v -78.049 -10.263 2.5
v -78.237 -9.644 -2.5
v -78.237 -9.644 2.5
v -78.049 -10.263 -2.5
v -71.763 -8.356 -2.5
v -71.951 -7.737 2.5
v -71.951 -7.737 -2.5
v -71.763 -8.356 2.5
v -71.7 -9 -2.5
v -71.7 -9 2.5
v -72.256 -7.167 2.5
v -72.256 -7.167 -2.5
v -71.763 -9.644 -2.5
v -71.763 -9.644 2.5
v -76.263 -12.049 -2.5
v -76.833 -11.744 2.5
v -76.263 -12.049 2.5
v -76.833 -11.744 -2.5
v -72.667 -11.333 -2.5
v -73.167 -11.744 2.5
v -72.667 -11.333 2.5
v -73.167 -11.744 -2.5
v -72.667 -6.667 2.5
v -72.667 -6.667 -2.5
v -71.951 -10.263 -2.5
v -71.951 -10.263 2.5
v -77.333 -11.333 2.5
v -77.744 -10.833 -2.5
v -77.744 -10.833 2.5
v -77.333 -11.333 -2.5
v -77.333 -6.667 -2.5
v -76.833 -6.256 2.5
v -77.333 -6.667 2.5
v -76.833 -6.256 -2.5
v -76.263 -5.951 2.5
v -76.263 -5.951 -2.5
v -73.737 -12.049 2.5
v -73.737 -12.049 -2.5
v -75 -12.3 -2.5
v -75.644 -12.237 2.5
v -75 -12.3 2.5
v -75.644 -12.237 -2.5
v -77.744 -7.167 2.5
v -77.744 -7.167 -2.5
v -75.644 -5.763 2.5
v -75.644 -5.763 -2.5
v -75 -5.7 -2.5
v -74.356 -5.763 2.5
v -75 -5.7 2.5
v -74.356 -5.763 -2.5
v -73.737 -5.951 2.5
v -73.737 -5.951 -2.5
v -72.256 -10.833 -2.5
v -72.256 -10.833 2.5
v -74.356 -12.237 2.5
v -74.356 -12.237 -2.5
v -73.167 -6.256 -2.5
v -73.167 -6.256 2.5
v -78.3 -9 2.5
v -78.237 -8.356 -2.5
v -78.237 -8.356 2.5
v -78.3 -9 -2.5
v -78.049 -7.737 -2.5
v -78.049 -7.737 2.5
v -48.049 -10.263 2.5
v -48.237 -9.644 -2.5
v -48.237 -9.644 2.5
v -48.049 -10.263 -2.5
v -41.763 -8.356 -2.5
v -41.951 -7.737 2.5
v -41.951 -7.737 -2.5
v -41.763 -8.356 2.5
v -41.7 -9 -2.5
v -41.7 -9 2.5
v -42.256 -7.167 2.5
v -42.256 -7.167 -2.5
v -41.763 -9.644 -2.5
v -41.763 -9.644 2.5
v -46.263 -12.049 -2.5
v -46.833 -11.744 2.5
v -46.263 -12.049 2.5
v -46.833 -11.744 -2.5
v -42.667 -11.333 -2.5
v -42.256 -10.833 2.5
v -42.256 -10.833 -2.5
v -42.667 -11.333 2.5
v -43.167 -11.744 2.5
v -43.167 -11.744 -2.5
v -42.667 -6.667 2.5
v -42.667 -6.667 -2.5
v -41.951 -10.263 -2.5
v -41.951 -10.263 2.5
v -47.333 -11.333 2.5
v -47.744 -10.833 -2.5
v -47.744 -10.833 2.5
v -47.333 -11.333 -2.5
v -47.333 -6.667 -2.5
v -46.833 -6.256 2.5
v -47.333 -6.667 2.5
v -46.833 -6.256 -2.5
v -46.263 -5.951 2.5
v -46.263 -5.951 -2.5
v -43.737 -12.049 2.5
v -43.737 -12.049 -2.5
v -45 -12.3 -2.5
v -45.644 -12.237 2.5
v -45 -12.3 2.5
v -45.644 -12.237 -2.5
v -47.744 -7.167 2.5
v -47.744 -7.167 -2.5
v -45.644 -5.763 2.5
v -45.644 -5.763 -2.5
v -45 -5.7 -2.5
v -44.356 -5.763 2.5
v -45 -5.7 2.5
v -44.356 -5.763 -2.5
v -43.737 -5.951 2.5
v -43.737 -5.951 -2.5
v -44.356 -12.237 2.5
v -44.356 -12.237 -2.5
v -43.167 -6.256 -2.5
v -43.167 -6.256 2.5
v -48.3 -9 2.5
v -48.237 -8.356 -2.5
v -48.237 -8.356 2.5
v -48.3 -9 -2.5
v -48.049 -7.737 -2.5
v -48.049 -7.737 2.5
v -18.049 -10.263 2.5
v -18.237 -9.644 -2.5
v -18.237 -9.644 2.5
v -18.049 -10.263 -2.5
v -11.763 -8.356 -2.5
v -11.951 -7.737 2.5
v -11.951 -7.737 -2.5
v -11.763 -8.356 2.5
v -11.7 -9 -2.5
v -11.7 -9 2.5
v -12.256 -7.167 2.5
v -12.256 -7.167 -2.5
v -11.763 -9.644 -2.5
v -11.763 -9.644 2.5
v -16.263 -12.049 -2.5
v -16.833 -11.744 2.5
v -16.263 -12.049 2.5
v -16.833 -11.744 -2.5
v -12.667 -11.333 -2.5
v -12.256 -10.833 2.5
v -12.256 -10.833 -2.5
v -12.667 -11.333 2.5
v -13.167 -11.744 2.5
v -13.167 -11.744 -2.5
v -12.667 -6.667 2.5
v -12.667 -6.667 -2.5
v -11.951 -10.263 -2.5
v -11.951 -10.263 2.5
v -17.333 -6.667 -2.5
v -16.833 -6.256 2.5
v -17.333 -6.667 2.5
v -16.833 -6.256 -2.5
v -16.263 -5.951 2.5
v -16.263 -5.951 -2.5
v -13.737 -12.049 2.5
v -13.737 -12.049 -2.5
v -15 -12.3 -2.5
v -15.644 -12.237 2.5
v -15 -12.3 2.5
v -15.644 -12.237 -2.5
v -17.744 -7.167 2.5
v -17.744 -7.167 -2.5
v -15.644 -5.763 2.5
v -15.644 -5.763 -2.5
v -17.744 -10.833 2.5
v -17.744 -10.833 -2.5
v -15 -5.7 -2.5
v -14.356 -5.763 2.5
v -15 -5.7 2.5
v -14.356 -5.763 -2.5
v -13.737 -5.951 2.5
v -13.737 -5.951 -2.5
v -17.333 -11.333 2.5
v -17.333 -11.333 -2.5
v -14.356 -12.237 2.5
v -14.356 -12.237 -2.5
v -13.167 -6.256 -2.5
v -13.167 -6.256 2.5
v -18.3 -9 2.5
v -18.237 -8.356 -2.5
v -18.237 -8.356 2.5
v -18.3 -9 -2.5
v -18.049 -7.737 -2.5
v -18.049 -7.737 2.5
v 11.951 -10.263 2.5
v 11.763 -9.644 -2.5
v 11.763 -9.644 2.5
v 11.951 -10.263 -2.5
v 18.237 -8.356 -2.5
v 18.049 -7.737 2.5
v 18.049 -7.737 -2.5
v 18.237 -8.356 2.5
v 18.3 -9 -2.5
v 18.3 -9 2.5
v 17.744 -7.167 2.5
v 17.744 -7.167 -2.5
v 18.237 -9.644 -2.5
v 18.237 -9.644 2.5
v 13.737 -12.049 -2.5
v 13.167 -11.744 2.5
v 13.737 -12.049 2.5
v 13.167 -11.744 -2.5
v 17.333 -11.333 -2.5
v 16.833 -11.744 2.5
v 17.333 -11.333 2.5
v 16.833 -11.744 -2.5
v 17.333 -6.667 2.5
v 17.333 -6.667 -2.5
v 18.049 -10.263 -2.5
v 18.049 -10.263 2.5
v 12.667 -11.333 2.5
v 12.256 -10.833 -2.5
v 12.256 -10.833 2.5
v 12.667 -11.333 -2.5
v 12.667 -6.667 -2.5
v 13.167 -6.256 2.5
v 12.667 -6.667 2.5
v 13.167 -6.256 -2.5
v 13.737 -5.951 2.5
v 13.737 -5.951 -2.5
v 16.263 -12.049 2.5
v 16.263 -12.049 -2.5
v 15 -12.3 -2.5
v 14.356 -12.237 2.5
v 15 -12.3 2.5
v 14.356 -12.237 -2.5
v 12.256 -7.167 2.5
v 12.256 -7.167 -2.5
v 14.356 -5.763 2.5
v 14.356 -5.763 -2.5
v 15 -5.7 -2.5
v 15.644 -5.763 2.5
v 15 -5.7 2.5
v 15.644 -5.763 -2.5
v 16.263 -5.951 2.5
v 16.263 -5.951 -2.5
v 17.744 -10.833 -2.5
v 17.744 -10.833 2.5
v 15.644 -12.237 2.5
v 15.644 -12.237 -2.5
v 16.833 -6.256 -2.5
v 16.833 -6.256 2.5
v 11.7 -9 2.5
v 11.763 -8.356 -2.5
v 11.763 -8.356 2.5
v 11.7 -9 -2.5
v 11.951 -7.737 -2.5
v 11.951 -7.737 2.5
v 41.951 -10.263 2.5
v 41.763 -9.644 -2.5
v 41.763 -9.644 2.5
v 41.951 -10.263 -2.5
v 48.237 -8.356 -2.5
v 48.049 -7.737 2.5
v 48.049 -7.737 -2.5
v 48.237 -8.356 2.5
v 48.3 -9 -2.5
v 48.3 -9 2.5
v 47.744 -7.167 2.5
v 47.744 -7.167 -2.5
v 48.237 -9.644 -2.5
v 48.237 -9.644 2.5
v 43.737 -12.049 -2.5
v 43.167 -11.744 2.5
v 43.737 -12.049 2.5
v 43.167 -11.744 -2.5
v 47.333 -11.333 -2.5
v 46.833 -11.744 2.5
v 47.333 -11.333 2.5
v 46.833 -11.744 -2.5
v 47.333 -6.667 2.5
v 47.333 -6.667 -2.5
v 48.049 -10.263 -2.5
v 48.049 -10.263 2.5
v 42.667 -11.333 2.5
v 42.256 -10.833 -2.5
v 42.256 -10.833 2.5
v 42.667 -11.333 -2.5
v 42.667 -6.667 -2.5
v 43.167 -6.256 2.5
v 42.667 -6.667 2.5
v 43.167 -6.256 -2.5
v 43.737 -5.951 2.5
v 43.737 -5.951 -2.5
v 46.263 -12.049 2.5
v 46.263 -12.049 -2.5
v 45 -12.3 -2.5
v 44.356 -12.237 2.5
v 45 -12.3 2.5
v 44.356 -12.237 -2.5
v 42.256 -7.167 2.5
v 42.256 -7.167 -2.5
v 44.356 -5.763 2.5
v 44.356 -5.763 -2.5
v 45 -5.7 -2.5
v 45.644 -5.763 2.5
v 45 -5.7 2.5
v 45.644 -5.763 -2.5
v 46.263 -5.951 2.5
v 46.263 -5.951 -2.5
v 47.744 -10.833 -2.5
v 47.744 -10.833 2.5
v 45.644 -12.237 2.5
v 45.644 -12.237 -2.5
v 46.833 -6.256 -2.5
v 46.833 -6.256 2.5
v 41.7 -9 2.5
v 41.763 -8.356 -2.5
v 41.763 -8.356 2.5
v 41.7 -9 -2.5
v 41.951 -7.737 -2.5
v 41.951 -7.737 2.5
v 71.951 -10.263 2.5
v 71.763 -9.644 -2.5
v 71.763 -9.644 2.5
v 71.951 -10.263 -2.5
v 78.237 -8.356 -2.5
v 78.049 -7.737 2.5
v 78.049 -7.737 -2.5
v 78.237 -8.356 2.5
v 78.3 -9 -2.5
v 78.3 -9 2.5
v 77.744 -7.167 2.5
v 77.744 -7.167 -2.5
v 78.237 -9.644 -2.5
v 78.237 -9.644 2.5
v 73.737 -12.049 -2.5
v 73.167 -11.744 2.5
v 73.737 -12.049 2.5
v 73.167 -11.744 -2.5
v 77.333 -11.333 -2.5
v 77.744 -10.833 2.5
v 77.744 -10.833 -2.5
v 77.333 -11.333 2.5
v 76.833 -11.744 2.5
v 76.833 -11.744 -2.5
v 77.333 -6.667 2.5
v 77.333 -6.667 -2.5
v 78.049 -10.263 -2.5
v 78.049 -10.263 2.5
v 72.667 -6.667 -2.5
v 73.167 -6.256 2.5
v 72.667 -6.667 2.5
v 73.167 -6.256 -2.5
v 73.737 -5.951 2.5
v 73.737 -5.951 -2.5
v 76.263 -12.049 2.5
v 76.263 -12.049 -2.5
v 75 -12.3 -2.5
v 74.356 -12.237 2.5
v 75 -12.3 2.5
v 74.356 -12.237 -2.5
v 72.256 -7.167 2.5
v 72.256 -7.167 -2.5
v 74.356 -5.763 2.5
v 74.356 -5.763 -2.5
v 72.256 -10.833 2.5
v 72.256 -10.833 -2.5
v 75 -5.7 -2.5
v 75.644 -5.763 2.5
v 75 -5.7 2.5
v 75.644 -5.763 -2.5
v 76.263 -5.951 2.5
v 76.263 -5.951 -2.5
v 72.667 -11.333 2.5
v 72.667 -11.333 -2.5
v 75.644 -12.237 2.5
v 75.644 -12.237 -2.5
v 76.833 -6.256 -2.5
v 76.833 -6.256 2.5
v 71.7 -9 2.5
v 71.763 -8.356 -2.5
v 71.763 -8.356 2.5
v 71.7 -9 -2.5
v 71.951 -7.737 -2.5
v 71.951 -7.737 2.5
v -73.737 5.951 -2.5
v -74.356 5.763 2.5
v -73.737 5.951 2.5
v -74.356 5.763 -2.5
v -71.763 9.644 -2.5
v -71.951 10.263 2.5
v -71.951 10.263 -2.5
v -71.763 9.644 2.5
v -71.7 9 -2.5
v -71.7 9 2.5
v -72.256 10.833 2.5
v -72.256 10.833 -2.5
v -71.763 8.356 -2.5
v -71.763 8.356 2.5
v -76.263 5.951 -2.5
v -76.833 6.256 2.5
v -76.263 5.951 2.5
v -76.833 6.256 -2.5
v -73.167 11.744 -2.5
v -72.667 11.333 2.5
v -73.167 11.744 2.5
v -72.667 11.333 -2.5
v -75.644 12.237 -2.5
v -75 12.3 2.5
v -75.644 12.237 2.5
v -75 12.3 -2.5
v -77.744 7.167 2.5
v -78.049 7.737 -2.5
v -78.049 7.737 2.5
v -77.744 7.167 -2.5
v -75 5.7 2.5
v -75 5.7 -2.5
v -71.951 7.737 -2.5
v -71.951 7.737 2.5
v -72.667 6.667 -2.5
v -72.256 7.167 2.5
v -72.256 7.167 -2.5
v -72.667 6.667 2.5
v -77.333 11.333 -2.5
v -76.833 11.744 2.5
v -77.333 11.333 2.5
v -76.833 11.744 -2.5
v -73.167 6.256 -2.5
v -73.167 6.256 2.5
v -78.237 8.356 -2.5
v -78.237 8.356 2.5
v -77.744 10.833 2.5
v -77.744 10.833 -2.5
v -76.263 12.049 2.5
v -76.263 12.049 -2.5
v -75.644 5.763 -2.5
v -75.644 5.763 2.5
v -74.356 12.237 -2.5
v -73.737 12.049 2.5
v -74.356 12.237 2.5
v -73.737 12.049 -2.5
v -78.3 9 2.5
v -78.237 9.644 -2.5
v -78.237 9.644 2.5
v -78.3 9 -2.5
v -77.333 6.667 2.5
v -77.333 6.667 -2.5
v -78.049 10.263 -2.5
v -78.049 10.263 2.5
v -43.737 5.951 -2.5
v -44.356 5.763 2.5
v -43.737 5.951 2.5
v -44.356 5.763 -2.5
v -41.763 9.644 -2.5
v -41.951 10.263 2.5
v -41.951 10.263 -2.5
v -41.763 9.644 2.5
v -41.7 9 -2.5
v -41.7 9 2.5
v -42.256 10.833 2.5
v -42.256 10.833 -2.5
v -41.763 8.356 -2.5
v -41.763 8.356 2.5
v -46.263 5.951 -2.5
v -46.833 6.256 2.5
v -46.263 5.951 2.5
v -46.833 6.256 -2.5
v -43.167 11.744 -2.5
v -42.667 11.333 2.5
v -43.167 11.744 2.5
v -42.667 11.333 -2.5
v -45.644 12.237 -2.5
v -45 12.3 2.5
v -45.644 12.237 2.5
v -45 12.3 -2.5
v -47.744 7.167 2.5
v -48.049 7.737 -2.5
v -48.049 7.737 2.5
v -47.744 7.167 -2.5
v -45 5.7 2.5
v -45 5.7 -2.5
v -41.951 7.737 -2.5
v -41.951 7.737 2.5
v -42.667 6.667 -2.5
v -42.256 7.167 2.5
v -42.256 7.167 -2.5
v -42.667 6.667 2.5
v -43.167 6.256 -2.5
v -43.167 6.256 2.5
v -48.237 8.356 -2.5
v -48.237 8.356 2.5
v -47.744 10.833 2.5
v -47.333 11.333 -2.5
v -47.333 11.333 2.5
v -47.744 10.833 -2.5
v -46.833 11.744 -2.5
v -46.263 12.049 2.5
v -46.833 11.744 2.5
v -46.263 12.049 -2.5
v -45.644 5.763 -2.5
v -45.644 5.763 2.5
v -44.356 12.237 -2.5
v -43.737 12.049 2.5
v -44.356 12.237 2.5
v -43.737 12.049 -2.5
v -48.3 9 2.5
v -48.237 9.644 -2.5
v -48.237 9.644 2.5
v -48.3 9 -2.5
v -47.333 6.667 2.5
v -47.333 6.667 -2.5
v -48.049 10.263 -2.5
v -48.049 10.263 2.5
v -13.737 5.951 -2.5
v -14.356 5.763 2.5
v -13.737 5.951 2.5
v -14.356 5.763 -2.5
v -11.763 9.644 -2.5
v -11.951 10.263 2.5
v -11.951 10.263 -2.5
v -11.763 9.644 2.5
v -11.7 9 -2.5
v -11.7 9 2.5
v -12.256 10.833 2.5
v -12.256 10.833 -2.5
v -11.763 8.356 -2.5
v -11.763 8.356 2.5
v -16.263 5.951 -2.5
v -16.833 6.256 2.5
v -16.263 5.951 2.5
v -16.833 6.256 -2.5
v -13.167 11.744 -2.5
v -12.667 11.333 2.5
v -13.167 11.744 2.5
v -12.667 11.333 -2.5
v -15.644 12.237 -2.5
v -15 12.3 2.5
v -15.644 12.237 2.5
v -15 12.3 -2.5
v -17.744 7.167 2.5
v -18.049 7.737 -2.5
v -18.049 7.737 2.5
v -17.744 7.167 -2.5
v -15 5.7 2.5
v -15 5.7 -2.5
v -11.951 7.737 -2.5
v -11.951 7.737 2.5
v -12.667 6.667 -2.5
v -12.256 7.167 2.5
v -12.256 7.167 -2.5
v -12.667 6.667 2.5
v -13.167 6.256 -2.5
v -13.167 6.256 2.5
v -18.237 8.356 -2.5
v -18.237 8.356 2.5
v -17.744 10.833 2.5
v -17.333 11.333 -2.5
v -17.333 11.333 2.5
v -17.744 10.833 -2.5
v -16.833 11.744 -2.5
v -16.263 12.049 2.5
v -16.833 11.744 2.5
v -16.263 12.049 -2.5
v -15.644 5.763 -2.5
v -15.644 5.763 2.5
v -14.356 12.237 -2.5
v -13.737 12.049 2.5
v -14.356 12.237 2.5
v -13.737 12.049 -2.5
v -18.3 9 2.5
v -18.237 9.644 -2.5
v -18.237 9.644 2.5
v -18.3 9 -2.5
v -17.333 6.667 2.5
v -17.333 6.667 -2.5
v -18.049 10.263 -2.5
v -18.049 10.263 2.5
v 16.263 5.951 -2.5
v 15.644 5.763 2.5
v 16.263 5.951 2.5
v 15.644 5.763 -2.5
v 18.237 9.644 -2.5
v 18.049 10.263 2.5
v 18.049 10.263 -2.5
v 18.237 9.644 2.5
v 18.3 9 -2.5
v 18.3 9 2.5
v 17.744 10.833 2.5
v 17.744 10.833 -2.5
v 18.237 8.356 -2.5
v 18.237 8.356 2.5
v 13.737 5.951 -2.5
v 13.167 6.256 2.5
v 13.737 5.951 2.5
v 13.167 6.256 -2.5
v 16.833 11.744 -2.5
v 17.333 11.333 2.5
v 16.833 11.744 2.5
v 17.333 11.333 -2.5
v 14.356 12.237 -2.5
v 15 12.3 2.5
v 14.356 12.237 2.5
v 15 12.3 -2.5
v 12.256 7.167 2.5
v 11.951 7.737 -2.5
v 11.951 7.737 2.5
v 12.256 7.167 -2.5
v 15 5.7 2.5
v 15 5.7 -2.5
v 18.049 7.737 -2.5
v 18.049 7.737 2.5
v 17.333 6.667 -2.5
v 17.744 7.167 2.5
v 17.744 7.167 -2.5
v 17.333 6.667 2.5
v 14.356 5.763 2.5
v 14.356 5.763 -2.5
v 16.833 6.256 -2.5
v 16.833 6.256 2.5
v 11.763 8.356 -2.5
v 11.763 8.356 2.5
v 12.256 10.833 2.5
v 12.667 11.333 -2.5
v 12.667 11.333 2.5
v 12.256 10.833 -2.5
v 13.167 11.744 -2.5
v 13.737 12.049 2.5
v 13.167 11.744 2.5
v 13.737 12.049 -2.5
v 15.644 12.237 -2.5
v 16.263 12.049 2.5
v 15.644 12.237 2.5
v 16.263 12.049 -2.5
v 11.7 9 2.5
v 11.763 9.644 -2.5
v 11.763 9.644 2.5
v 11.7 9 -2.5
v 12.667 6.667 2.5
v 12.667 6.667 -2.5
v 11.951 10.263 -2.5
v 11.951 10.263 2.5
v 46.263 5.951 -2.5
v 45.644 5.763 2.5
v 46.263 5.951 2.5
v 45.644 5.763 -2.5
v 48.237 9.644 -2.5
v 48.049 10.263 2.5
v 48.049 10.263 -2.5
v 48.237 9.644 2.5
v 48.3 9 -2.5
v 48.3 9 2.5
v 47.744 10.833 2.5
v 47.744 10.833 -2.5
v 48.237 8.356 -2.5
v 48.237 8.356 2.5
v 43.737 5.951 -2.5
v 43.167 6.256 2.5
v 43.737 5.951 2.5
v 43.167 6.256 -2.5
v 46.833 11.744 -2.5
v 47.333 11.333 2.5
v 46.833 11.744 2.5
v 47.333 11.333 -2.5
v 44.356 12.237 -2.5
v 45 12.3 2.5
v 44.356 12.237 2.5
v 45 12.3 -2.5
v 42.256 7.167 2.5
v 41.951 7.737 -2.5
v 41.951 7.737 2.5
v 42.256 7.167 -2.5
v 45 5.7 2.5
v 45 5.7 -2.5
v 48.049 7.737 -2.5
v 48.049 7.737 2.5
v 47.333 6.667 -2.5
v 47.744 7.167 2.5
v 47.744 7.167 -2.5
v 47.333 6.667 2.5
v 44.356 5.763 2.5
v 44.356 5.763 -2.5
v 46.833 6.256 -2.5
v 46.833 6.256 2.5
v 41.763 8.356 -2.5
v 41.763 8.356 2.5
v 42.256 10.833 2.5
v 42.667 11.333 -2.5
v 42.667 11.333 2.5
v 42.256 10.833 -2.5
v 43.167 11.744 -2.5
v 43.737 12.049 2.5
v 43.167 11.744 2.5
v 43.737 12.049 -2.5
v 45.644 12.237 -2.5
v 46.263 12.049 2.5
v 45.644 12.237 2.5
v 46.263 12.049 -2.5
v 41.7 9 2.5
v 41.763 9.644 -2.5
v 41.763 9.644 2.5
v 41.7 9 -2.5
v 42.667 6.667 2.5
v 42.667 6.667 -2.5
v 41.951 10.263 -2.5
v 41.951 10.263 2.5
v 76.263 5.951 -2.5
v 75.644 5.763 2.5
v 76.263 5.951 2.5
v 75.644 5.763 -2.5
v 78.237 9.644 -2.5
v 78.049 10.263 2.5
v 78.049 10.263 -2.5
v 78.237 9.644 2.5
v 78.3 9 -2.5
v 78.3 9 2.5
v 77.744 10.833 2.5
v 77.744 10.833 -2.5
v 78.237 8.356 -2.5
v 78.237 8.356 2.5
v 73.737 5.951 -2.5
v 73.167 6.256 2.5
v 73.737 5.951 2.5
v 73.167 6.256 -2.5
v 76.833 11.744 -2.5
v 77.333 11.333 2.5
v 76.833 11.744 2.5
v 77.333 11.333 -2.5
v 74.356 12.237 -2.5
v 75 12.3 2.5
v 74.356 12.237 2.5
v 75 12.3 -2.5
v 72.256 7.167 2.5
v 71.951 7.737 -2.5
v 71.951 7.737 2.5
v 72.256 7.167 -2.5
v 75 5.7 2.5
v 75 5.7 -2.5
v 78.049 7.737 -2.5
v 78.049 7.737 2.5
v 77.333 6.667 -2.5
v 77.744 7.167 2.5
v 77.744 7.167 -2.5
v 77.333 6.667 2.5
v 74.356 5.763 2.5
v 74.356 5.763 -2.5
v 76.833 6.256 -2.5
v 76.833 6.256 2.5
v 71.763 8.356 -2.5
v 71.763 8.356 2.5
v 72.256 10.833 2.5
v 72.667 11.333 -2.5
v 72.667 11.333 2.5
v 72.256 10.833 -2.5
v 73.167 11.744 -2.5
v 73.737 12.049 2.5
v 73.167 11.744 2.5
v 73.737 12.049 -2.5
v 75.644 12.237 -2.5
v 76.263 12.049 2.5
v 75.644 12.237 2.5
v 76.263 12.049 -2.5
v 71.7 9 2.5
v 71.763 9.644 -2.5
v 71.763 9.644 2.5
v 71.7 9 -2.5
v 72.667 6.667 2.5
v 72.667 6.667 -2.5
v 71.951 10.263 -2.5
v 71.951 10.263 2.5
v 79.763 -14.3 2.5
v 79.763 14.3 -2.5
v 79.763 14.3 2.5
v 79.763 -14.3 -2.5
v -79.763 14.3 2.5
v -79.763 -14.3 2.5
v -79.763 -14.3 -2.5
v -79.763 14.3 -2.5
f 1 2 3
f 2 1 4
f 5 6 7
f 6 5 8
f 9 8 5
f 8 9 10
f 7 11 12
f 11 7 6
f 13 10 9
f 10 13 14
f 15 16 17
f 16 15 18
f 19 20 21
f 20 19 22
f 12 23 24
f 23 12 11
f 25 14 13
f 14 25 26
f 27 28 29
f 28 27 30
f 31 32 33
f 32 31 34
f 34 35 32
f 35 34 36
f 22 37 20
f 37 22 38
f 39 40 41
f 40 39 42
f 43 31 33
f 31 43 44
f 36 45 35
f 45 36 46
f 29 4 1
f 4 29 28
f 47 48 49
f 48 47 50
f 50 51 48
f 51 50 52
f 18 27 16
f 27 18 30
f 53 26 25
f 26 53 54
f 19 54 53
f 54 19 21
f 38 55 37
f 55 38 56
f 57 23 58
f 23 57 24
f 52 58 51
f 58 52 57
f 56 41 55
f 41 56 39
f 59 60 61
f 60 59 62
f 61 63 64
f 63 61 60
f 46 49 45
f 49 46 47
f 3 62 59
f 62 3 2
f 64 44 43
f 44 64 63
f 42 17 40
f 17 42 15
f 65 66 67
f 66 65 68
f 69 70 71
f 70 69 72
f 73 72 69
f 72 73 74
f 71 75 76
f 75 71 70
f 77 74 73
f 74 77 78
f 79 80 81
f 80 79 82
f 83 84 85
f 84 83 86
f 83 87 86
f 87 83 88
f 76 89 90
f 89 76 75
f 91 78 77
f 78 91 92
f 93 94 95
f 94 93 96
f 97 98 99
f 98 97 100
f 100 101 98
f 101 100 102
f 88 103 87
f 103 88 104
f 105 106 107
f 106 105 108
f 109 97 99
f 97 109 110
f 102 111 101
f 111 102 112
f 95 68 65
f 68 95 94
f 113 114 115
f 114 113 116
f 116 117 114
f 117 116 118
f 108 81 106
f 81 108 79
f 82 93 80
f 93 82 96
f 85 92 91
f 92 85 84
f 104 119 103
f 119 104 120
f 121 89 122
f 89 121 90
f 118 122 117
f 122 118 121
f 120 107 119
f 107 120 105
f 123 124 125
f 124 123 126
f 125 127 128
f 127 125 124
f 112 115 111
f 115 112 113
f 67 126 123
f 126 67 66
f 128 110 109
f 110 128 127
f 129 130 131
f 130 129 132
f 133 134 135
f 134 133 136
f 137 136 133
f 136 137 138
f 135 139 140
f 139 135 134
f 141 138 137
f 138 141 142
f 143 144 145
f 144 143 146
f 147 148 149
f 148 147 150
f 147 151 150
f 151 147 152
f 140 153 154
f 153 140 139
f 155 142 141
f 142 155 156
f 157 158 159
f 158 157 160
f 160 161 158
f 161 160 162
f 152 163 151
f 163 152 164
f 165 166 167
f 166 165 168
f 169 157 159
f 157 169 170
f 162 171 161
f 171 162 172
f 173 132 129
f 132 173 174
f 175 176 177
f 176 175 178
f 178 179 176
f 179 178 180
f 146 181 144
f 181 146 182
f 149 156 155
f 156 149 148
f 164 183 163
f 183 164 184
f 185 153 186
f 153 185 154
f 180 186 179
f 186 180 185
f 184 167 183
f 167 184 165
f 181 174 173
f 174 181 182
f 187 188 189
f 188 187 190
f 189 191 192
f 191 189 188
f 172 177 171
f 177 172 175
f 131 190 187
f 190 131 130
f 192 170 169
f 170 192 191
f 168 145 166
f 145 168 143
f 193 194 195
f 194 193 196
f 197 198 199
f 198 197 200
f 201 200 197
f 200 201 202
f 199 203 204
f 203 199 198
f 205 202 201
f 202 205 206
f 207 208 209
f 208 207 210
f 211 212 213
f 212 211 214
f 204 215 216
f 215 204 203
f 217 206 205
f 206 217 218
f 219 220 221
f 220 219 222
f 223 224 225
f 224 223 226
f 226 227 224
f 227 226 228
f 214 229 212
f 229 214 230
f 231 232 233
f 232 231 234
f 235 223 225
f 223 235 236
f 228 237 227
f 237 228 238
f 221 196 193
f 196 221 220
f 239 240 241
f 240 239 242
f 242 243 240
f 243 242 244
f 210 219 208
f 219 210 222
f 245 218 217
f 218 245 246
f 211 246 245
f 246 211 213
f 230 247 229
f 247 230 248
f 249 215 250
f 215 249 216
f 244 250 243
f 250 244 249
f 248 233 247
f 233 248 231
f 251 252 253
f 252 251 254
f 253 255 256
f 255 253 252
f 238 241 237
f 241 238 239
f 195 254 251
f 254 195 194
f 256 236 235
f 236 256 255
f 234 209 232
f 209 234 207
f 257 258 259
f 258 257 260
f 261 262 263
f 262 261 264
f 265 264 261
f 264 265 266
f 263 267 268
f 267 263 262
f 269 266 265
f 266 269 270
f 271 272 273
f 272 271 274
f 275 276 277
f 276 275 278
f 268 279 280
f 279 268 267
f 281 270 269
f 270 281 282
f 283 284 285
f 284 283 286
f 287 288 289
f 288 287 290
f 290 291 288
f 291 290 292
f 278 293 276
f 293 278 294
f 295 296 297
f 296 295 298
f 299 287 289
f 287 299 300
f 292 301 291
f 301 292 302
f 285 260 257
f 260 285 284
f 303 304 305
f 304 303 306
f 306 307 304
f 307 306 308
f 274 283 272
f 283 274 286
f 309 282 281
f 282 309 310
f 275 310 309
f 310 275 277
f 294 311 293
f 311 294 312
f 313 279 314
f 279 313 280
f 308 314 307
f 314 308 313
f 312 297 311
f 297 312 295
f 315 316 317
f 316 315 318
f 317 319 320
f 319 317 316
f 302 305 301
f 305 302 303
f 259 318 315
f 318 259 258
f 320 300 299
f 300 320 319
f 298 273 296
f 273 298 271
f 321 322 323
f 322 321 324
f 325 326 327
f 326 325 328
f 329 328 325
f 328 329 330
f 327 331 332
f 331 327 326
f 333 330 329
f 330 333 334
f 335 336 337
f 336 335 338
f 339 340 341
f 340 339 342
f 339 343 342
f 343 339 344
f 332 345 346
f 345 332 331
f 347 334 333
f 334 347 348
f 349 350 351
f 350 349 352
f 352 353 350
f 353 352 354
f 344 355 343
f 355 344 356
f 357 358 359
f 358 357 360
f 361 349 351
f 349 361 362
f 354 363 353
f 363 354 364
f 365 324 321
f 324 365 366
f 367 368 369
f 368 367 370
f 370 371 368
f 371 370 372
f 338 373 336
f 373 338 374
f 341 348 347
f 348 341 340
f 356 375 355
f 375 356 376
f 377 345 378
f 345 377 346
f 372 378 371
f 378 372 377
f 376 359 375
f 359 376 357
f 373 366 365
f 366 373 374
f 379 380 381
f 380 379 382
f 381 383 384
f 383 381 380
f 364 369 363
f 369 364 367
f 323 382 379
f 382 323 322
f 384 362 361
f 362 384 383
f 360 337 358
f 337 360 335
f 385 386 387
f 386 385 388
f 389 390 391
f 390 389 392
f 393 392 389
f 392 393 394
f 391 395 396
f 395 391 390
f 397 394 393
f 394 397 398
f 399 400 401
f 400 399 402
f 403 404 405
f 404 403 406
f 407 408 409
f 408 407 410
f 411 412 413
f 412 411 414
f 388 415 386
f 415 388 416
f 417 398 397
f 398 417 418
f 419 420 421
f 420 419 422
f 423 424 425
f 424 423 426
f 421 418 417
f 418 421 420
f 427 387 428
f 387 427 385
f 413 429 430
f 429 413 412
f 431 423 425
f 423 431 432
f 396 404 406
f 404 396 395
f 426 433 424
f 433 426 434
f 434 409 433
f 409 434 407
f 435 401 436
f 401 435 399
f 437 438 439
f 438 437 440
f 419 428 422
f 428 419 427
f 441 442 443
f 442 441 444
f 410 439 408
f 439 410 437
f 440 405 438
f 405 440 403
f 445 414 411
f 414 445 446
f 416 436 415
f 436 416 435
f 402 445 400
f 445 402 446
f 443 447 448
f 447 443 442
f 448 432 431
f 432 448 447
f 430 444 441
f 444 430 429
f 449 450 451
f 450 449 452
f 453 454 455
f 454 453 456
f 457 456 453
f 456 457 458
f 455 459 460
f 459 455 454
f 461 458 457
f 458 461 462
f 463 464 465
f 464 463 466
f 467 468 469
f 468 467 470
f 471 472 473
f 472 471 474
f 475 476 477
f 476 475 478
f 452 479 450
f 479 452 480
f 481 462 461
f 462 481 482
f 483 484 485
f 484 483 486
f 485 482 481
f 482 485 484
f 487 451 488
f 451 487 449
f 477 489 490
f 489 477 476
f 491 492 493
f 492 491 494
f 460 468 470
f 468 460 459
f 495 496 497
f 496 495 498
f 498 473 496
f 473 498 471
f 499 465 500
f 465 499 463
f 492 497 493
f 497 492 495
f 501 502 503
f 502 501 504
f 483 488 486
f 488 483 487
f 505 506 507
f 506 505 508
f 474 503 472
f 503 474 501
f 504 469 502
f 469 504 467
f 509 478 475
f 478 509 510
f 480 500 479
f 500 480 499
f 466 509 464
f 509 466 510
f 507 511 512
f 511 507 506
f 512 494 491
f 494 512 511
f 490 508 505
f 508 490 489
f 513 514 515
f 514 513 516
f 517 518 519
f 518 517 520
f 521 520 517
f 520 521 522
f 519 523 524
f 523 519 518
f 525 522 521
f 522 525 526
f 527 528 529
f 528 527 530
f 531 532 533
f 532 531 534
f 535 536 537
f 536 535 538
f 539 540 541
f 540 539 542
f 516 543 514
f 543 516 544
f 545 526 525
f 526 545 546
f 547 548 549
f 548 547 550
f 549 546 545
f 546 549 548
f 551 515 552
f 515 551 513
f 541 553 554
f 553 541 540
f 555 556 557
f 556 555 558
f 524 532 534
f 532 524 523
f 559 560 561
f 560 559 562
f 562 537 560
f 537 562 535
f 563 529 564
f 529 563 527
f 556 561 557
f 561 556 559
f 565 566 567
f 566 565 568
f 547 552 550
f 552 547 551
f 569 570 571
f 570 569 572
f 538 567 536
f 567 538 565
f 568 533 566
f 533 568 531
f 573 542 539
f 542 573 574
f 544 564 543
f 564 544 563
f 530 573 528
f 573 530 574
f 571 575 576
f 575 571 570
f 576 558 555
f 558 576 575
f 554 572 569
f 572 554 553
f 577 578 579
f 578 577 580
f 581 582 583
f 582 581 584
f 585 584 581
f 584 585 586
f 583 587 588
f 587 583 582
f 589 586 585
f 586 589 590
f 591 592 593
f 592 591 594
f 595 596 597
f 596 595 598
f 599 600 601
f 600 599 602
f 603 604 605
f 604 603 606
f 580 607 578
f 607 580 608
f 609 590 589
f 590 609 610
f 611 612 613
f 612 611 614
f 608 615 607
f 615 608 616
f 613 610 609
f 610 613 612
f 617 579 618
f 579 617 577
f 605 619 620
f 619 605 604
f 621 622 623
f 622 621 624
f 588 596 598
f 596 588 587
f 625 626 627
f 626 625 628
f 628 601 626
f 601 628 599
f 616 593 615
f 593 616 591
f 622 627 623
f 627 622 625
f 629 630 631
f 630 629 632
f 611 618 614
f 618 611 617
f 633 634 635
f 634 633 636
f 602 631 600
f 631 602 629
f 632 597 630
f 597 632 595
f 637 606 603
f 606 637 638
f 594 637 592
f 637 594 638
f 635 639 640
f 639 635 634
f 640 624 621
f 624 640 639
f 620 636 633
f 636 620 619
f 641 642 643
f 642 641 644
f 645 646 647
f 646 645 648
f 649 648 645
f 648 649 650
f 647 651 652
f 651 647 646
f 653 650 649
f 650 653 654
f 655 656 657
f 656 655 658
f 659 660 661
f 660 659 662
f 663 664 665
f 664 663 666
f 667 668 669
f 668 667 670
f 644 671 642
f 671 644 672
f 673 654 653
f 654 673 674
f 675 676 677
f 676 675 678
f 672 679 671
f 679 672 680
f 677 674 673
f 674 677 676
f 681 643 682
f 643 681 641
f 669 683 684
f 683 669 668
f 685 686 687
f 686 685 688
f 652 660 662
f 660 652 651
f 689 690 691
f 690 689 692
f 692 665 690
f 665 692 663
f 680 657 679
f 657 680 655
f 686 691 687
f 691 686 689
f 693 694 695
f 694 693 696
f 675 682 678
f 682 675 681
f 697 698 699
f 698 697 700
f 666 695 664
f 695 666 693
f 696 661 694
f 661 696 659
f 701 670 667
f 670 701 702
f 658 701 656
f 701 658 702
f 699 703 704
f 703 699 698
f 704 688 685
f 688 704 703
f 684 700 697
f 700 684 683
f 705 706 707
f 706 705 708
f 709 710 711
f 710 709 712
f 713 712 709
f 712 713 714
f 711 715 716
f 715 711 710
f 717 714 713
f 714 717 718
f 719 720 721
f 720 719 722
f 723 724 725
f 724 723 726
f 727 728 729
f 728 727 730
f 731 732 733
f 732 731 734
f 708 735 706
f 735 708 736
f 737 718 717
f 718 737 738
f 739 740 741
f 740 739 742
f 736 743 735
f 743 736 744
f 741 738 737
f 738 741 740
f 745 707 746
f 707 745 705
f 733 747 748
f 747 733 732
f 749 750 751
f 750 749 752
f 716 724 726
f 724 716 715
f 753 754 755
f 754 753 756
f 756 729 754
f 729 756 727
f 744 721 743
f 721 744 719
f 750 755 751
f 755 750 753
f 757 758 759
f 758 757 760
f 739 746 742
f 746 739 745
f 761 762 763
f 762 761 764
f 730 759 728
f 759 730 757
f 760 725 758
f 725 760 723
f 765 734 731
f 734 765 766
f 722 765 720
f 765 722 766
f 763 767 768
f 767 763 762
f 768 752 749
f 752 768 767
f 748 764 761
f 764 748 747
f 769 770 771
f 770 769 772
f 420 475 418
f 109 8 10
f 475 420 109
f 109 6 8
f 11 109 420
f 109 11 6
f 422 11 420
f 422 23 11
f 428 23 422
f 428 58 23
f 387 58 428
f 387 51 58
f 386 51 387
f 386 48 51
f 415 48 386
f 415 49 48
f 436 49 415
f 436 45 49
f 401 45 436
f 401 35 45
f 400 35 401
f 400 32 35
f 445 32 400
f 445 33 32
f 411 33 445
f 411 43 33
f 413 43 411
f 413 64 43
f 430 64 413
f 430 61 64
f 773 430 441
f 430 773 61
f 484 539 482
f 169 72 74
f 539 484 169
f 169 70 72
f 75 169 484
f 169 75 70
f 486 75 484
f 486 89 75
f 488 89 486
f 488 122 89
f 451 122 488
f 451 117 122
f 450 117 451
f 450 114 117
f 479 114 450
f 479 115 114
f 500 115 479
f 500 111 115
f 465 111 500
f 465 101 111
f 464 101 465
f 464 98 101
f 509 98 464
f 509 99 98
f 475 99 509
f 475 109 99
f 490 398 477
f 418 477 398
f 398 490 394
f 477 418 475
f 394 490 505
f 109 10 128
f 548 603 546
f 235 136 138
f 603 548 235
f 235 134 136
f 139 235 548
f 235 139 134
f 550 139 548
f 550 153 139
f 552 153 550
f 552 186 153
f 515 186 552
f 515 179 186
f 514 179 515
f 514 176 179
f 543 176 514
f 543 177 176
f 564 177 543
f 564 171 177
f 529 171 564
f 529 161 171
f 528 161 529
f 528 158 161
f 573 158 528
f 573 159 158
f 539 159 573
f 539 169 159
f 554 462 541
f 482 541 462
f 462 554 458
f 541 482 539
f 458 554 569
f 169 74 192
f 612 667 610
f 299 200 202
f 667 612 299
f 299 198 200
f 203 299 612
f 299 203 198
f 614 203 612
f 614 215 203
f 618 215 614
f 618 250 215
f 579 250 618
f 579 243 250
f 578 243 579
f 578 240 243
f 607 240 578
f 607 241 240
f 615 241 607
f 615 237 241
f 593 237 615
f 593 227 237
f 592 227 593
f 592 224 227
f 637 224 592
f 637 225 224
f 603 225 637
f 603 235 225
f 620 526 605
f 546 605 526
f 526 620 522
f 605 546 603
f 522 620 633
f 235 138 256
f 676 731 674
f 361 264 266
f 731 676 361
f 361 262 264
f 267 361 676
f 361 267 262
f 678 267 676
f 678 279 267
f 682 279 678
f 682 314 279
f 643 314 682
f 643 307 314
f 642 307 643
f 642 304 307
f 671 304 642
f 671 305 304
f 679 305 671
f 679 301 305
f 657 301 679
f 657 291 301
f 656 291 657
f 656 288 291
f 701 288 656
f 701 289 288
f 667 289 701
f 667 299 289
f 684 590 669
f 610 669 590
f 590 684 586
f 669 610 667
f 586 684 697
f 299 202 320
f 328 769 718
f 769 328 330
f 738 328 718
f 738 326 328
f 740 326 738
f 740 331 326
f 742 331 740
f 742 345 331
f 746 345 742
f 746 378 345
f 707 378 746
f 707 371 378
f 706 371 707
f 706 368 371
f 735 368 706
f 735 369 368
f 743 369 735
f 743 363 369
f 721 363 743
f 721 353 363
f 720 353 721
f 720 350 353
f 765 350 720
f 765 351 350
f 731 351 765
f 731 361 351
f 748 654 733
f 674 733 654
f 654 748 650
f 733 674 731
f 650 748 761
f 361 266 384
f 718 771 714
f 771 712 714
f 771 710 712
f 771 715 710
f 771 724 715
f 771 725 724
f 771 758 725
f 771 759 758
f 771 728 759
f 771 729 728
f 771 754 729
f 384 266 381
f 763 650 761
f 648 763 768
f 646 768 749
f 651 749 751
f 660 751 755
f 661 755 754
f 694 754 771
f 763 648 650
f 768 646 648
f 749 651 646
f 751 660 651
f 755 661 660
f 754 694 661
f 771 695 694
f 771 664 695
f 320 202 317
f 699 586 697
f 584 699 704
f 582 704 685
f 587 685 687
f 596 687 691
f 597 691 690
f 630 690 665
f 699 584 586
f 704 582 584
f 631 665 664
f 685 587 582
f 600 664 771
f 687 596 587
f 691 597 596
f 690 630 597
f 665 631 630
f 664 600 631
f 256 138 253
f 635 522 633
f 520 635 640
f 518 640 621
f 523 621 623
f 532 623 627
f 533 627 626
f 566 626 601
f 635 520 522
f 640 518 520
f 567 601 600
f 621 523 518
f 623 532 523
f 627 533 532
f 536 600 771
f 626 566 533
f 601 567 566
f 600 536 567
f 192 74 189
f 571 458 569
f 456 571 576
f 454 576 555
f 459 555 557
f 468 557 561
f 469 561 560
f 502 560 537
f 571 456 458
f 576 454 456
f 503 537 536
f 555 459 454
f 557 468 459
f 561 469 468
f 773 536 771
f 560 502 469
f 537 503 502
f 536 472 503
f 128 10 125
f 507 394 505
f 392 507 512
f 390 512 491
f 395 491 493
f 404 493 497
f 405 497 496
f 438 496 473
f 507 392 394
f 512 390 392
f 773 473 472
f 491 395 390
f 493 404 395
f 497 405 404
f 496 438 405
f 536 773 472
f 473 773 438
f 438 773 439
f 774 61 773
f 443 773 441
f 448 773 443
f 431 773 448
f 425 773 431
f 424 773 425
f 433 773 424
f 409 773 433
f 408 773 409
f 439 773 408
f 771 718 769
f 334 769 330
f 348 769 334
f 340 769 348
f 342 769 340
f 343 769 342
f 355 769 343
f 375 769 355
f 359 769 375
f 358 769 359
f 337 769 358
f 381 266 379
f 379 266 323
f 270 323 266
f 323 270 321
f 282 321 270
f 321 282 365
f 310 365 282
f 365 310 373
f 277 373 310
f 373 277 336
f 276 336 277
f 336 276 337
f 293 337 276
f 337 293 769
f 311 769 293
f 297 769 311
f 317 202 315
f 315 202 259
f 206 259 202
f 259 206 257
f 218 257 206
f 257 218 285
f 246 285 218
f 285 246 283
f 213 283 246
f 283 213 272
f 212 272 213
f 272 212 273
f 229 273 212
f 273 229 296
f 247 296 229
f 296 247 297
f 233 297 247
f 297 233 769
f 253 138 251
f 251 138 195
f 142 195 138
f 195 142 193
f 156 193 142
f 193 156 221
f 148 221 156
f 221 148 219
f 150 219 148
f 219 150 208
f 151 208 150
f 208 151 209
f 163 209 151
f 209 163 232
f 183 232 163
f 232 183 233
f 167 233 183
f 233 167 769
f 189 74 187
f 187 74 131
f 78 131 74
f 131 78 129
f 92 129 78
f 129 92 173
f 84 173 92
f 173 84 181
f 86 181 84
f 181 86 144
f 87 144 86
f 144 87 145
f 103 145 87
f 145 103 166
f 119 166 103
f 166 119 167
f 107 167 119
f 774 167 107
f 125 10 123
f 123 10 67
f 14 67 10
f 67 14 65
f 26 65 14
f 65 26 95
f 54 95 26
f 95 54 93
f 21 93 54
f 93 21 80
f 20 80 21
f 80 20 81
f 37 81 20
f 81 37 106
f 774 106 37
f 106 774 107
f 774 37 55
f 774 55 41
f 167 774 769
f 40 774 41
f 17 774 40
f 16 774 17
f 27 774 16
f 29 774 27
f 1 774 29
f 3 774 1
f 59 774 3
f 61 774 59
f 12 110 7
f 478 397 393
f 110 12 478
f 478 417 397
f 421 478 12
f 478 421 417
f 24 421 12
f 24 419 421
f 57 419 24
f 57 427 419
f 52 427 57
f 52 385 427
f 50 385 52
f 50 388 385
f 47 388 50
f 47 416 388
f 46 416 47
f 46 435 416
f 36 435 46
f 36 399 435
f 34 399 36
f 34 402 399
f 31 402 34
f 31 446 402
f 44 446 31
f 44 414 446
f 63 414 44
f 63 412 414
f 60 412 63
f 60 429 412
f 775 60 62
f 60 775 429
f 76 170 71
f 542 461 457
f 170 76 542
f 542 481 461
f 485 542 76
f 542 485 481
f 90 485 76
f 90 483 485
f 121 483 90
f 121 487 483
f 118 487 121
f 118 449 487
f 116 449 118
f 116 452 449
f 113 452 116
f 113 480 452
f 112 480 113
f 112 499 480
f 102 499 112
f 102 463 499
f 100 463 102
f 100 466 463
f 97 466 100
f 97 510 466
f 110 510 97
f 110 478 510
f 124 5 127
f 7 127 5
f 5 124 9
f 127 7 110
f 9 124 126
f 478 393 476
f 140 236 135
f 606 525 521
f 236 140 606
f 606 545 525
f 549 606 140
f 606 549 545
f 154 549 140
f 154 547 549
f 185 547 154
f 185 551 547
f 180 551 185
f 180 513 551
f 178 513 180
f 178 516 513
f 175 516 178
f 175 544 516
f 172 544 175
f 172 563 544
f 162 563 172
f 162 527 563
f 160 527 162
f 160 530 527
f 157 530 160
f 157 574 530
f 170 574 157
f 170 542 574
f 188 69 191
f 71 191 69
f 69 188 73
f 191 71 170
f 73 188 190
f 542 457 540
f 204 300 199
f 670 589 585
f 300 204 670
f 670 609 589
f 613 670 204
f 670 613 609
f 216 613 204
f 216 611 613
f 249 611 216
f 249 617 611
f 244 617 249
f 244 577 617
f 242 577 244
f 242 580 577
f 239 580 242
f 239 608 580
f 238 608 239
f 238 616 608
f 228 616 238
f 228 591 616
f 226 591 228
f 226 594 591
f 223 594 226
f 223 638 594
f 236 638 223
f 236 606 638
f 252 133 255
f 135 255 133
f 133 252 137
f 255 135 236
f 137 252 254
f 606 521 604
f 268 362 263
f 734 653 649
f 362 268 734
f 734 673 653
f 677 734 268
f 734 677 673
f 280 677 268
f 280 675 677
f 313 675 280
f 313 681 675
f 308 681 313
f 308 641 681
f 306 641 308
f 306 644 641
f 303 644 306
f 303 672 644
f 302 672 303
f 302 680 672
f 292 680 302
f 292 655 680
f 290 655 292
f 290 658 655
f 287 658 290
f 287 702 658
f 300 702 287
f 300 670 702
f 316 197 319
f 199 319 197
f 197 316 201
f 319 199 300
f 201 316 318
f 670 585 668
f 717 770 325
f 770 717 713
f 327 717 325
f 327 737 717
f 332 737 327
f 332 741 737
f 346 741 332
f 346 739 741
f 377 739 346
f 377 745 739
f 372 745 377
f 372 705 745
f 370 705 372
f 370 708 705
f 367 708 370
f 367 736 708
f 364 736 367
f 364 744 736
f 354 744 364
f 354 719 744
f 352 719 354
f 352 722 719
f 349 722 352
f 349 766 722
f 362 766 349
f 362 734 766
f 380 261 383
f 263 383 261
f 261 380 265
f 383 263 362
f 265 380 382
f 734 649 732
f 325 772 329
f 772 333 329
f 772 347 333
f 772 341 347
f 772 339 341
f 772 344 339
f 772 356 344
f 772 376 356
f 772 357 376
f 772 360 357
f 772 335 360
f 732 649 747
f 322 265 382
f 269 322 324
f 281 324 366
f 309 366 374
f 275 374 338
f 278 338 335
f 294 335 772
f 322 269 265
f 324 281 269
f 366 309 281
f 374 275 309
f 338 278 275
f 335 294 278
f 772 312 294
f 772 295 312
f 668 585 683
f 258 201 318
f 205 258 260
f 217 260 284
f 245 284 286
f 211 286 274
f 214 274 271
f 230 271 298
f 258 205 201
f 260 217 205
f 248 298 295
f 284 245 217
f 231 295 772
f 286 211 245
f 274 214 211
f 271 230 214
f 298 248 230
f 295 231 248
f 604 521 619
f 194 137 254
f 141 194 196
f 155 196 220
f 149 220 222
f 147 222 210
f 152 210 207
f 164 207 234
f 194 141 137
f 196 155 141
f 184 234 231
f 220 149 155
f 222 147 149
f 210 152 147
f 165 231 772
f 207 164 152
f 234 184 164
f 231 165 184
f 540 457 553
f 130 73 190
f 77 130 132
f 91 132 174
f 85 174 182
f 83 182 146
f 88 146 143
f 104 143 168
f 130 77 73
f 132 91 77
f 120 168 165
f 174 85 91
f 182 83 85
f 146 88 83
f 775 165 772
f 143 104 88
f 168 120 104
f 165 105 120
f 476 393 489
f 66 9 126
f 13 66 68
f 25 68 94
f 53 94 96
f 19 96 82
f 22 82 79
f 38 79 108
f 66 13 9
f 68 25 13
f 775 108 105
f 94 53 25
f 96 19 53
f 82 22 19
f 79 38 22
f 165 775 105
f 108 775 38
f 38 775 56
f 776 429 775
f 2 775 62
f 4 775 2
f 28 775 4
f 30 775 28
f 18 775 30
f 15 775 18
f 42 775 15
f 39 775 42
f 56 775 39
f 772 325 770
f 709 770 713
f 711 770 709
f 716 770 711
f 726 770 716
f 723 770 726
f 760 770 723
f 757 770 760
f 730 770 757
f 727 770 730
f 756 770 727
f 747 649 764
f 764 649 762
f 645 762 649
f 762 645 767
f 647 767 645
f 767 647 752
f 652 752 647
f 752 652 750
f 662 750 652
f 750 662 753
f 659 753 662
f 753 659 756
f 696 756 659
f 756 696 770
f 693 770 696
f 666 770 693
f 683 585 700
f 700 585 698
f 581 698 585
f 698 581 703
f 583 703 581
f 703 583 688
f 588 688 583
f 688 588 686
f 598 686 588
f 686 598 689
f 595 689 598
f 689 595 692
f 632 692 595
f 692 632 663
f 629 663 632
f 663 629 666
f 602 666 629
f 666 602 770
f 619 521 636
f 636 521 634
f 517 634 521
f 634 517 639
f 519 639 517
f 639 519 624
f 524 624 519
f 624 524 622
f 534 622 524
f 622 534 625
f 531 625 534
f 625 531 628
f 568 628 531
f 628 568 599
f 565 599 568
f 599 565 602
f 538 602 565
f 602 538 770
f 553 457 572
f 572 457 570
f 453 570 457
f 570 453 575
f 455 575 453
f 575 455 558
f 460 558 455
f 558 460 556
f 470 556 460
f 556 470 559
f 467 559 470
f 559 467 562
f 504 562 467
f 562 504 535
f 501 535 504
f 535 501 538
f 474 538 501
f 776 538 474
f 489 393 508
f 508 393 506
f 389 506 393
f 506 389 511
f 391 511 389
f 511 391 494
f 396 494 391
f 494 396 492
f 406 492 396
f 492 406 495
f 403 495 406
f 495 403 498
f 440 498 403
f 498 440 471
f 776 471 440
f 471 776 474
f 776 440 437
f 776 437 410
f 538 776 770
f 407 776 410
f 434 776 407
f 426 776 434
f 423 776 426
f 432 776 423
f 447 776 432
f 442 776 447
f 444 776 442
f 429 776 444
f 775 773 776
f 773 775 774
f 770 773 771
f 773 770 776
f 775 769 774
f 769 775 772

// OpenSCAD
$fn = 32;

// ----------------------------------------------------------------------
// Hole bar, 6 x Ø6.6
// tworows layout, 4.7625 mm edge offset
// ----------------------------------------------------------------------

// --- parameters (mm) ---
bar_w = 28.6;     // bar width (Y)
bar_t = 5;        // bar thickness (Z)
holes = 6;        // holes per row
hole_d = 6.6;     // hole diameter
edge = 4.763;     // offset from the bar end to the first hole
pitch = 30;       // pitch between neighbouring holes
row_offset = 18;  // distance between the two rows

// --- derived feature positions (mm) ---
span = (holes - 1) * pitch;   // = 150   distance between the end holes
bar_l = span + 2 * edge;      // = 159.53   overall bar length
start_x = -bar_l / 2 + edge;  // = -75   X of the first hole
feature_centers = [
  [start_x + 0 * pitch, -row_offset / 2],
  [start_x + 1 * pitch, -row_offset / 2],
  [start_x + 2 * pitch, -row_offset / 2],
  [start_x + 3 * pitch, -row_offset / 2],
  [start_x + 4 * pitch, -row_offset / 2],
  [start_x + 5 * pitch, -row_offset / 2]
];   // hole centres of the first row
row2_centers = [
  [start_x + 0 * pitch, row_offset / 2],
  [start_x + 1 * pitch, row_offset / 2],
  [start_x + 2 * pitch, row_offset / 2],
  [start_x + 3 * pitch, row_offset / 2],
  [start_x + 4 * pitch, row_offset / 2],
  [start_x + 5 * pitch, row_offset / 2]
];   // hole centres of the second row

// bar with two rows of holes, both read from their own centre arrays
difference() {
  translate([-bar_l / 2, -bar_w / 2, -bar_t / 2]) cube([bar_l, bar_w, bar_t]);
  for (centre = feature_centers)
    translate([centre[0], centre[1], 0])
      cylinder(d = hole_d, h = bar_t + 2, center = true);
  for (centre = row2_centers)
    translate([centre[0], centre[1], 0])
      cylinder(d = hole_d, h = bar_t + 2, center = true);
}
